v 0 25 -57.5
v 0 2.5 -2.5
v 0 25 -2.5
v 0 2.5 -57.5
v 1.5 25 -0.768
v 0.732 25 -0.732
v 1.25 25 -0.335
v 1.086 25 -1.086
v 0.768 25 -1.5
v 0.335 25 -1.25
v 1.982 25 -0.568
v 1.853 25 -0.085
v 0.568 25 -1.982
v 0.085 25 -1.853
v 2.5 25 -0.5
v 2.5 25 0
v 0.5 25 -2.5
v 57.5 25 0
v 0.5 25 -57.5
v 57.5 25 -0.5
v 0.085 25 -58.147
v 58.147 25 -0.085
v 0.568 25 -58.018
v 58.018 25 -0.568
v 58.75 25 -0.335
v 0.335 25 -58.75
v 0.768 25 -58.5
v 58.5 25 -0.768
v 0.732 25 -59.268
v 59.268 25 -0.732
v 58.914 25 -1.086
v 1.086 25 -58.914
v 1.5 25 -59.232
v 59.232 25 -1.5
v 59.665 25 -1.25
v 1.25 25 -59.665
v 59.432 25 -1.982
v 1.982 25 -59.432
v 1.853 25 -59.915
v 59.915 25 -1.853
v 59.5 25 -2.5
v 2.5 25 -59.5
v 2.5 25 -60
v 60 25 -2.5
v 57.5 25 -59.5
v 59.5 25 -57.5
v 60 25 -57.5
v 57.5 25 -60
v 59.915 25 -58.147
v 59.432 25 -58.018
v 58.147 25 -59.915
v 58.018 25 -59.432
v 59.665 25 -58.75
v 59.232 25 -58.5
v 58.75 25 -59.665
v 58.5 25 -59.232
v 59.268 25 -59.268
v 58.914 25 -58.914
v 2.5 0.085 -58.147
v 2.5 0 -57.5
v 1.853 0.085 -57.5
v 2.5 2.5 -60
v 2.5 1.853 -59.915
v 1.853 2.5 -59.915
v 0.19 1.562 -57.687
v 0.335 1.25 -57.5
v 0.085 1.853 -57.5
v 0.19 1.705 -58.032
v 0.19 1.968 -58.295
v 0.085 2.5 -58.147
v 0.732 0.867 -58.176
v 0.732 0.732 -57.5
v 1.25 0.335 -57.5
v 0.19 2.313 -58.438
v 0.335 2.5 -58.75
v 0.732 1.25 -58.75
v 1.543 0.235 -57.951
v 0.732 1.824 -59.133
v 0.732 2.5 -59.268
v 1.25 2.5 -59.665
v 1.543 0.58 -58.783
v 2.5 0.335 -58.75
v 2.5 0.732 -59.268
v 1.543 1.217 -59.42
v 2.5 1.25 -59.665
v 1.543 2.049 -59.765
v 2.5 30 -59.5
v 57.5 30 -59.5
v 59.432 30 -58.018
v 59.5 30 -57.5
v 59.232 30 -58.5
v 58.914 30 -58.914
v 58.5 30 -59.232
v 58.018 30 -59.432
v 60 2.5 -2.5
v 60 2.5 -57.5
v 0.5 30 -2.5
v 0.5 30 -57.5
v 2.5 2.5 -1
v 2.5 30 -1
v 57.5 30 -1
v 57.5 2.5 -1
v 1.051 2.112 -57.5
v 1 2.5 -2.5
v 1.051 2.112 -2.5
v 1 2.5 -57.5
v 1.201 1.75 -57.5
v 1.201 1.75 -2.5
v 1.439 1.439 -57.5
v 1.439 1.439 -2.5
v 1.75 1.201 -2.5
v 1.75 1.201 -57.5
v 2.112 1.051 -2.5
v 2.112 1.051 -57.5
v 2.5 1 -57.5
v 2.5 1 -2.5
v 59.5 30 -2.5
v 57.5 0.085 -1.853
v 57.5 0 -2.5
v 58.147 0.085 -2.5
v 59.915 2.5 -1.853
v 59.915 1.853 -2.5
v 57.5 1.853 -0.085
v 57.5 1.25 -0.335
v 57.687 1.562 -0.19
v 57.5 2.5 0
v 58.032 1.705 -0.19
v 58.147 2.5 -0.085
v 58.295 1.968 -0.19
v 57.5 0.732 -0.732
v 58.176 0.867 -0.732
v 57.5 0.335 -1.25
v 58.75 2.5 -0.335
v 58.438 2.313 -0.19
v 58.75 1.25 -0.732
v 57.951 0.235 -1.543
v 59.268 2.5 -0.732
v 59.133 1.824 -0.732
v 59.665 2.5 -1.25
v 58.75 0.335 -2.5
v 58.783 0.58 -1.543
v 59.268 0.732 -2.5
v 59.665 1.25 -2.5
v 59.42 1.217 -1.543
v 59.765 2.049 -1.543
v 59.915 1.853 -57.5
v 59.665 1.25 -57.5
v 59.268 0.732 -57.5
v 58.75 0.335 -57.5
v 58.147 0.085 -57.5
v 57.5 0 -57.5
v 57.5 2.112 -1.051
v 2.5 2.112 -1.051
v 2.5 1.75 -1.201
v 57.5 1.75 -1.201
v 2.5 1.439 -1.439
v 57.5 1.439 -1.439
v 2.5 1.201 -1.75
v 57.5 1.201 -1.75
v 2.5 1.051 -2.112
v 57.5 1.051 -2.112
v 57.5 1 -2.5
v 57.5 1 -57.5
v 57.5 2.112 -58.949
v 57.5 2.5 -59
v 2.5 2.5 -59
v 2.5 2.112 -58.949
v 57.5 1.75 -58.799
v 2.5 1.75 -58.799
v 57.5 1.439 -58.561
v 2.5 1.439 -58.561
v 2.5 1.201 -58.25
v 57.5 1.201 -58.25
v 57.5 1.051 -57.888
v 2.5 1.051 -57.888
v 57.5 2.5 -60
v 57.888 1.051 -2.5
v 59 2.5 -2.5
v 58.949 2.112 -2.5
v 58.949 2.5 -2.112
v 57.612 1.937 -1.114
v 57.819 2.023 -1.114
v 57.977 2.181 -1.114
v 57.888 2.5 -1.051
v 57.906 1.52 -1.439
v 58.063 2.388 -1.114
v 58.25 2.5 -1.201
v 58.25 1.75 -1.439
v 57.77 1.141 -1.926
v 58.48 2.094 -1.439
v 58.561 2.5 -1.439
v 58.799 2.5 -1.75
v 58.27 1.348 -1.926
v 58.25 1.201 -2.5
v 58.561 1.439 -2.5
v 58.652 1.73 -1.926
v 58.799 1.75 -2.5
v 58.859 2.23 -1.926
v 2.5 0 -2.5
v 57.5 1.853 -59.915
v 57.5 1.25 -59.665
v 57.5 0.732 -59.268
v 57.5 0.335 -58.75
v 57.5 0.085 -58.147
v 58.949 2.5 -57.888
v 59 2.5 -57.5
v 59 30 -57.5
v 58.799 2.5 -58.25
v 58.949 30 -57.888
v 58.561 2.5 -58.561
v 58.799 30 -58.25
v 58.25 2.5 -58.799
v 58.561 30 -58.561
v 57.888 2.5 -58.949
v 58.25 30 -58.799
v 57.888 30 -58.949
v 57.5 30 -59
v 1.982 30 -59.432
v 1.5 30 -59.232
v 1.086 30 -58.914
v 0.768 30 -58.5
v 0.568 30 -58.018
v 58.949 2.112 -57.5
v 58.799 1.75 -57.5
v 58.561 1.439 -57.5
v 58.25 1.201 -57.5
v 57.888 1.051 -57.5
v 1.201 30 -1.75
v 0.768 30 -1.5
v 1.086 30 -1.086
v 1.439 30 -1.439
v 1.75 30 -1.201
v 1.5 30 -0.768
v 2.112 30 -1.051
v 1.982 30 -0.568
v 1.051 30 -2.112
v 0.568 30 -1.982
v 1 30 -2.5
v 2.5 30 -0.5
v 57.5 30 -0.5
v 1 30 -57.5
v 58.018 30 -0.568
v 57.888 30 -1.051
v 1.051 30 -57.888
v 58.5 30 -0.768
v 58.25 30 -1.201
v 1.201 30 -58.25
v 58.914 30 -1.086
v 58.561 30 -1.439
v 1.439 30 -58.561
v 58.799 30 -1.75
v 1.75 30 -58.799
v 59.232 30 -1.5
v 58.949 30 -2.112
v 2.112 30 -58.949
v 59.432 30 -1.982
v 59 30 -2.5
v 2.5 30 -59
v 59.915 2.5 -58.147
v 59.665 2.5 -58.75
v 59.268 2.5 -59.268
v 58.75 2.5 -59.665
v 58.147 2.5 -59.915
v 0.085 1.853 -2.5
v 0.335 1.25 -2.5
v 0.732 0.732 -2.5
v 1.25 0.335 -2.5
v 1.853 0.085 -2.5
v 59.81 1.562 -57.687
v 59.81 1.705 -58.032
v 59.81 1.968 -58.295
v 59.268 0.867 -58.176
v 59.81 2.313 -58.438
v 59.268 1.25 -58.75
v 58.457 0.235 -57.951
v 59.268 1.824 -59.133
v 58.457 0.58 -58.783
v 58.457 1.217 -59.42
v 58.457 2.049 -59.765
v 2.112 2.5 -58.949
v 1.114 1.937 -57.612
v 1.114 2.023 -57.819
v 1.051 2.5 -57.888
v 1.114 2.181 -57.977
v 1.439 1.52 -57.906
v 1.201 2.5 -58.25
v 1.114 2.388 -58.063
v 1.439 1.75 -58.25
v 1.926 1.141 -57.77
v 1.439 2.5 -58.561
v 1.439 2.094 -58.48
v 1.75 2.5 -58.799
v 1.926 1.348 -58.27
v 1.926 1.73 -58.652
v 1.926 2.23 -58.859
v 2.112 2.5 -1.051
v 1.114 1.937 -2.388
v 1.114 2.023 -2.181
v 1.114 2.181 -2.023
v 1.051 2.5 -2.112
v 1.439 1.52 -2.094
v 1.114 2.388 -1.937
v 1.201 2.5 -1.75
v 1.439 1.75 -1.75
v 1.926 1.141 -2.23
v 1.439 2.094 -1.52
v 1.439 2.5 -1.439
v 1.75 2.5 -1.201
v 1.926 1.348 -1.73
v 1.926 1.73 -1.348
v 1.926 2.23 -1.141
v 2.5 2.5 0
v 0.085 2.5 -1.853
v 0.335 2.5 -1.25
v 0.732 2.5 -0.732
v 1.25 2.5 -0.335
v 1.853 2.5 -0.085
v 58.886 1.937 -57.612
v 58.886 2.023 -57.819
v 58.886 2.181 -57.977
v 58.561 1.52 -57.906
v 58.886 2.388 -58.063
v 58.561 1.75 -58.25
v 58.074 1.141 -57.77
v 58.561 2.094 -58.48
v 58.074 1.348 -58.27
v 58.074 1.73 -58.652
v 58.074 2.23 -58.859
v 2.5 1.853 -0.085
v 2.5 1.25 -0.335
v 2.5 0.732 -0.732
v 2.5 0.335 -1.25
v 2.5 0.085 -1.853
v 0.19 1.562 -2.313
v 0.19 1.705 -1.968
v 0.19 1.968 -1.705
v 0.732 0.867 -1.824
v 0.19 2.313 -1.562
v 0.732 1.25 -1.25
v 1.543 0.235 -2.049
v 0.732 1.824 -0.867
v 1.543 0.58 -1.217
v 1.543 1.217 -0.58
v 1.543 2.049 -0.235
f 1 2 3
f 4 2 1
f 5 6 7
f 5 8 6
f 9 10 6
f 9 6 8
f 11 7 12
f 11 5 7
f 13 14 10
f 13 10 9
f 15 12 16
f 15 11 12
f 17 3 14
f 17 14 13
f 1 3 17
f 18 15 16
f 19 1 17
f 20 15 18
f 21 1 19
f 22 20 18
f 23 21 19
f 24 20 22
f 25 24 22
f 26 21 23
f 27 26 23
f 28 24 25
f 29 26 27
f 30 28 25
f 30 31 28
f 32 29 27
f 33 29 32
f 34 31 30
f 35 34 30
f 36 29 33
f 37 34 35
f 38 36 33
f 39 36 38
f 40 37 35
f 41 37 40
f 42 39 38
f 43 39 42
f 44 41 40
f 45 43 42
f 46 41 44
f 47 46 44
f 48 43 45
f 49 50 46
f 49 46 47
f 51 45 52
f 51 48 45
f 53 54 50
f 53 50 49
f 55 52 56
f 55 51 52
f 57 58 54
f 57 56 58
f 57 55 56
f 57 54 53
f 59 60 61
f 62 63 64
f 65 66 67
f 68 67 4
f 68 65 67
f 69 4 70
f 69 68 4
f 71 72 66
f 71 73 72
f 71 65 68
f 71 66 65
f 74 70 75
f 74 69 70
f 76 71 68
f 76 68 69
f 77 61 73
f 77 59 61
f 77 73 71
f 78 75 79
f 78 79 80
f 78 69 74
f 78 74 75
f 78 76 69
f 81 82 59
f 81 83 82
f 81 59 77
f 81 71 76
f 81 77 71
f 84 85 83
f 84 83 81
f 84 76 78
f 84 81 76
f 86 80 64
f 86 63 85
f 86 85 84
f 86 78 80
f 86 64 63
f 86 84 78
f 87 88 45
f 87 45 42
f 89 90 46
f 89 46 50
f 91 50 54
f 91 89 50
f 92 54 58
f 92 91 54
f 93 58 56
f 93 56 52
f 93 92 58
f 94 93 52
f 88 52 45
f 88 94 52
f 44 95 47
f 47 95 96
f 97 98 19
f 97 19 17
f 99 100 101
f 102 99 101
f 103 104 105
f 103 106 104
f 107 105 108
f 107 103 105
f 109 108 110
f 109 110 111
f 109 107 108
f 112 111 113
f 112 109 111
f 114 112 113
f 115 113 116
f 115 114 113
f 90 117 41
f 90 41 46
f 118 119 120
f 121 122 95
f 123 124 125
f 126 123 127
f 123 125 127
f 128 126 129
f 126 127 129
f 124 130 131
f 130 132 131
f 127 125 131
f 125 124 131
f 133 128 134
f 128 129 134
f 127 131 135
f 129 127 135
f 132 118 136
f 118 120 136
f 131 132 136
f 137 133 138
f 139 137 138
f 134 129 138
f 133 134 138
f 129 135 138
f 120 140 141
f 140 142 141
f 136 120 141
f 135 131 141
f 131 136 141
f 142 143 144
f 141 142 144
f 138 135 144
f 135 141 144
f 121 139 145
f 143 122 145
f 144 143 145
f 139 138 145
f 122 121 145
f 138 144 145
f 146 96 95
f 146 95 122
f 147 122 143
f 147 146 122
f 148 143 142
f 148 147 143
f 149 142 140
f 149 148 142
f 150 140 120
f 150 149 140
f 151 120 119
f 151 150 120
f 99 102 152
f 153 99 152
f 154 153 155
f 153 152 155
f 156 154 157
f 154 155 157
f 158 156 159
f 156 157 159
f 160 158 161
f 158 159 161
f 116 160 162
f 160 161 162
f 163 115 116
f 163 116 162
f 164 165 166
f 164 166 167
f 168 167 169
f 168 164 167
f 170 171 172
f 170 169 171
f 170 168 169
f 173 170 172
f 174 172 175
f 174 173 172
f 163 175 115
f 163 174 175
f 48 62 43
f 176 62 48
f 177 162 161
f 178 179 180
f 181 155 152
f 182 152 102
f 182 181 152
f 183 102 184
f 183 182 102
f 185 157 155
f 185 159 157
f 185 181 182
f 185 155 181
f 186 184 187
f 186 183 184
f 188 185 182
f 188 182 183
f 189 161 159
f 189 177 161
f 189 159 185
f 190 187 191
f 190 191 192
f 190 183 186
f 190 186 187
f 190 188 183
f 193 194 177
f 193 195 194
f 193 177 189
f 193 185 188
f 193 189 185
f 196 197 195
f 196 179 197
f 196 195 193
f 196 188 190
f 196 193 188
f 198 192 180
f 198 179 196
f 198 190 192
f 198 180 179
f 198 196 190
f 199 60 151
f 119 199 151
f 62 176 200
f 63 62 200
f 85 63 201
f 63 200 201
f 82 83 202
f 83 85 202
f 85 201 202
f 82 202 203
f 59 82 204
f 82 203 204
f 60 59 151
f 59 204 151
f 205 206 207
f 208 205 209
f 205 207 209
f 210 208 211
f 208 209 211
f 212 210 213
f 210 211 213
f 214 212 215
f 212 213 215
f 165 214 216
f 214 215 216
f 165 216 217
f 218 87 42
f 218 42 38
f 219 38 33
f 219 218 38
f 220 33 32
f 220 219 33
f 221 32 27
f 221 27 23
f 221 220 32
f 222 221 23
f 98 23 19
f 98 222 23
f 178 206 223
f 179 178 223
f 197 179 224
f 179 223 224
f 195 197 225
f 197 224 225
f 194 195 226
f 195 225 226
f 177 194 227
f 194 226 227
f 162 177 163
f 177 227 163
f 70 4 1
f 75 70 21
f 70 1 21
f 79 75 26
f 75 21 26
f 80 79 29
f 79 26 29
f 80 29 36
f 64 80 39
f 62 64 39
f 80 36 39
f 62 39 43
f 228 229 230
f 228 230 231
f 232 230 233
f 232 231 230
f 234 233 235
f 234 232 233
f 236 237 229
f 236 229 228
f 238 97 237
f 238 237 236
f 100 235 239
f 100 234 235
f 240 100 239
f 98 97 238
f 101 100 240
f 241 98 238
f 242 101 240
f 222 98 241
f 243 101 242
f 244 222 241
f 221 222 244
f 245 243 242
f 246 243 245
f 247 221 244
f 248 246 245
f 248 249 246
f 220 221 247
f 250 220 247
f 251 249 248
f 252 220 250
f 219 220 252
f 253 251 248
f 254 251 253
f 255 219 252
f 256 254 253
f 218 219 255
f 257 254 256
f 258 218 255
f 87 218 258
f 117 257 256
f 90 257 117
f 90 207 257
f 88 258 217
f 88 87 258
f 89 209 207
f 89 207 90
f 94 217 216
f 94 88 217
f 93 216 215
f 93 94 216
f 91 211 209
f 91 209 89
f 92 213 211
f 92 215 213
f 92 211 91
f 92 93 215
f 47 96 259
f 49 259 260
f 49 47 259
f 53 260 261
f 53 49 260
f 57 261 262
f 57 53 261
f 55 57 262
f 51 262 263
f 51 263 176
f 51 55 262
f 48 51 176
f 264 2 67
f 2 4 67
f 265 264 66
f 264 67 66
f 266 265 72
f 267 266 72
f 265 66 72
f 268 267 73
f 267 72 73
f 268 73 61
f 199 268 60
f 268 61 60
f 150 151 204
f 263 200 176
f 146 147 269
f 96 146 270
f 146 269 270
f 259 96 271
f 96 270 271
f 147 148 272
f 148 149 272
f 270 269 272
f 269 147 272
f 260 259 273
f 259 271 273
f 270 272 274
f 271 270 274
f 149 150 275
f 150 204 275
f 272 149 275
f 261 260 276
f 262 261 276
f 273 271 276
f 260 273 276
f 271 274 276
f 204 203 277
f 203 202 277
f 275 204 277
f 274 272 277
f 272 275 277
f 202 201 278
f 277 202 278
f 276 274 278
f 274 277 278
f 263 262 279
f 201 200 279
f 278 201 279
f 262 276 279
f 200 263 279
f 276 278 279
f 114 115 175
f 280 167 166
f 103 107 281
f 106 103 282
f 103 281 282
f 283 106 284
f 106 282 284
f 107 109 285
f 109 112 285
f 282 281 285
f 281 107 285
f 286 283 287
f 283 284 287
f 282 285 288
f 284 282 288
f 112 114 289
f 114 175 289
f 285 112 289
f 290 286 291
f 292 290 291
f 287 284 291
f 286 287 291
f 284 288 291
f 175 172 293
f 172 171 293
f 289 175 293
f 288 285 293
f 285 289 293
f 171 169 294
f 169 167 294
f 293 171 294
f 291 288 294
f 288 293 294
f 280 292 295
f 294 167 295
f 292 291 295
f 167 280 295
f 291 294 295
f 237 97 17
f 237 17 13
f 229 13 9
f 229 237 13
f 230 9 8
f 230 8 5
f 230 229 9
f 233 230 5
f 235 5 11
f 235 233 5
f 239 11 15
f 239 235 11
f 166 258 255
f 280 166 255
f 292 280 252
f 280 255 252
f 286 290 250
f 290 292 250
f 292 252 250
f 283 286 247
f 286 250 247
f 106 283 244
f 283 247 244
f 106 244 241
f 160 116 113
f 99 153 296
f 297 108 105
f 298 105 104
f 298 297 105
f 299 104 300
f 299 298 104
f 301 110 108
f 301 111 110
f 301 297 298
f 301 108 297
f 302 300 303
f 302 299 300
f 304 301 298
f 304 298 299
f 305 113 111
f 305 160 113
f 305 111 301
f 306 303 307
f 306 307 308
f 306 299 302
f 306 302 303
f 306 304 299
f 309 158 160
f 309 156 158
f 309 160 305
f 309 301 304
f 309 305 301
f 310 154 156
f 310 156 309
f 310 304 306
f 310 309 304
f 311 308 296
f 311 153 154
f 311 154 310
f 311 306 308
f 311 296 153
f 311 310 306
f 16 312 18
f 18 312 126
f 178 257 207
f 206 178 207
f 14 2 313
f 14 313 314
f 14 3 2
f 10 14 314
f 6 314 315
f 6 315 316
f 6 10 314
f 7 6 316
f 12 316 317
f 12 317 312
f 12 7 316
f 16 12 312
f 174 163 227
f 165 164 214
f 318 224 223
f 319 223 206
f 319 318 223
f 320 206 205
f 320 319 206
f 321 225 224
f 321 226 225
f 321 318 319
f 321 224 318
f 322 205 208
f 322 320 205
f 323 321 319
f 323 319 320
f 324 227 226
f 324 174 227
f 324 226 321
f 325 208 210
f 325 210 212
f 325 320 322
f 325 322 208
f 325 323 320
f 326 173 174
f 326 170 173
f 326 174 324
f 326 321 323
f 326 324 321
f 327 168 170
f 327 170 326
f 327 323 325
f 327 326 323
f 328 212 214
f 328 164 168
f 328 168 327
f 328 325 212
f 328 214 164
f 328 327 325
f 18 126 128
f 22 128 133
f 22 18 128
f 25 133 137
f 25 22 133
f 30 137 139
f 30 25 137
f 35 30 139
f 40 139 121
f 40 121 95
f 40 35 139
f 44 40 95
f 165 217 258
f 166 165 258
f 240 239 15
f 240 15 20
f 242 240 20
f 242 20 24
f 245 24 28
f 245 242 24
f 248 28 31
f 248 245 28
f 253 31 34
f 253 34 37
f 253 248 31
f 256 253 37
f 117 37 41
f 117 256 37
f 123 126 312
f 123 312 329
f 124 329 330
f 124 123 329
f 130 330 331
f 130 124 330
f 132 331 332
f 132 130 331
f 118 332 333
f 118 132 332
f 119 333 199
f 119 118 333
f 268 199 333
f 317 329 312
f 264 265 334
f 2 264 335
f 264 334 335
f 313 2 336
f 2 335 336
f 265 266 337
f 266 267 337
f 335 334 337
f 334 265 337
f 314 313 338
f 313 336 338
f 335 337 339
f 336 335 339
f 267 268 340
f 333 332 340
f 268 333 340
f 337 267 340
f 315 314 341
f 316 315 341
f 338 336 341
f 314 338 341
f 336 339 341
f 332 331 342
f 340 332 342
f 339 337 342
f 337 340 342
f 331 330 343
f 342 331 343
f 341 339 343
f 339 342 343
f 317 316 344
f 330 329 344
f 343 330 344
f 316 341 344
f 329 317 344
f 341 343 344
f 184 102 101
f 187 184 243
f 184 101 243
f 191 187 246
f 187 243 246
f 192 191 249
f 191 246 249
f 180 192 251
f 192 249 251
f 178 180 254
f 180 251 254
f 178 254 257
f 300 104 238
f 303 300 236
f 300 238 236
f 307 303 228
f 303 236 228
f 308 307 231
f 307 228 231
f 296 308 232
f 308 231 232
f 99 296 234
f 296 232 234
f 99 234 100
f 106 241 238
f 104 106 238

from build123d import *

# Parameters (mm, degrees)
SKETCH1_W           = 60
SKETCH1_H           = 60
BOSS_EXTRUDE1_DEPTH = 25
FILLET1_R           = 2.5
SHELL1_T            = -1
BOSS_EXTRUDE2_START = 5
BOSS_EXTRUDE2_DEPTH = 5


with BuildPart() as part:
    # Sketch1 → Boss-Extrude1 (new body)
    with BuildSketch(Plane(origin=(0, 0, 0), x_dir=(1, 0, 0), z_dir=(0, 1, 0))):
        with Locations((30, 30)):
            Rectangle(SKETCH1_W, SKETCH1_H)
    extrude(amount=BOSS_EXTRUDE1_DEPTH)

    # Fillet1
    fillet1_edges = [part.edges().sort_by_distance(p)[0] for p in [
        (30, 0, -60),
        (60, 0, -30),
        (30, 0, 0),
        (0, 0, -30),
        (0, 12.5, -60),
        (60, 12.5, -60),
        (60, 12.5, 0),
        (0, 12.5, 0),
    ]]
    fillet(fillet1_edges, radius=FILLET1_R)

    # Shell1
    shell1_openings = [part.faces().sort_by_distance(p)[0] for p in [
        (30, 25, -30),
    ]]
    offset(amount=SHELL1_T, openings=shell1_openings, kind=Kind.INTERSECTION)

    # Sketch5 → Boss-Extrude2 (add)
    with BuildSketch(Plane(origin=(0, 25, 0), x_dir=(1, 0, 0), z_dir=(0, 1, 0)).offset(BOSS_EXTRUDE2_START)):
        with BuildLine():
            Line((57.5, 59.5), (2.5, 59.5))
            ThreePointArc((2.5, 59.5), (1.085786438, 58.914213562), (0.5, 57.5))
            Line((0.5, 57.5), (0.5, 2.5))
            ThreePointArc((0.5, 2.5), (1.085786438, 1.085786438), (2.5, 0.5))
            Line((2.5, 0.5), (57.5, 0.5))
            ThreePointArc((57.5, 0.5), (58.914213562, 1.085786438), (59.5, 2.5))
            Line((59.5, 2.5), (59.5, 57.5))
            ThreePointArc((59.5, 57.5), (58.914213562, 58.914213562), (57.5, 59.5))
        make_face()
        with BuildLine():
            Line((57.5, 59), (2.5, 59))
            ThreePointArc((2.5, 59), (1.439339828, 58.560660172), (1, 57.5))
            Line((1, 57.5), (1, 2.5))
            ThreePointArc((1, 2.5), (1.439339828, 1.439339828), (2.5, 1))
            Line((2.5, 1), (57.5, 1))
            ThreePointArc((57.5, 1), (58.560660172, 1.439339828), (59, 2.5))
            Line((59, 2.5), (59, 57.5))
            ThreePointArc((59, 57.5), (58.560660172, 58.560660172), (57.5, 59))
        make_face(mode=Mode.SUBTRACT)
    extrude(amount=-BOSS_EXTRUDE2_DEPTH)


solid = part.part
